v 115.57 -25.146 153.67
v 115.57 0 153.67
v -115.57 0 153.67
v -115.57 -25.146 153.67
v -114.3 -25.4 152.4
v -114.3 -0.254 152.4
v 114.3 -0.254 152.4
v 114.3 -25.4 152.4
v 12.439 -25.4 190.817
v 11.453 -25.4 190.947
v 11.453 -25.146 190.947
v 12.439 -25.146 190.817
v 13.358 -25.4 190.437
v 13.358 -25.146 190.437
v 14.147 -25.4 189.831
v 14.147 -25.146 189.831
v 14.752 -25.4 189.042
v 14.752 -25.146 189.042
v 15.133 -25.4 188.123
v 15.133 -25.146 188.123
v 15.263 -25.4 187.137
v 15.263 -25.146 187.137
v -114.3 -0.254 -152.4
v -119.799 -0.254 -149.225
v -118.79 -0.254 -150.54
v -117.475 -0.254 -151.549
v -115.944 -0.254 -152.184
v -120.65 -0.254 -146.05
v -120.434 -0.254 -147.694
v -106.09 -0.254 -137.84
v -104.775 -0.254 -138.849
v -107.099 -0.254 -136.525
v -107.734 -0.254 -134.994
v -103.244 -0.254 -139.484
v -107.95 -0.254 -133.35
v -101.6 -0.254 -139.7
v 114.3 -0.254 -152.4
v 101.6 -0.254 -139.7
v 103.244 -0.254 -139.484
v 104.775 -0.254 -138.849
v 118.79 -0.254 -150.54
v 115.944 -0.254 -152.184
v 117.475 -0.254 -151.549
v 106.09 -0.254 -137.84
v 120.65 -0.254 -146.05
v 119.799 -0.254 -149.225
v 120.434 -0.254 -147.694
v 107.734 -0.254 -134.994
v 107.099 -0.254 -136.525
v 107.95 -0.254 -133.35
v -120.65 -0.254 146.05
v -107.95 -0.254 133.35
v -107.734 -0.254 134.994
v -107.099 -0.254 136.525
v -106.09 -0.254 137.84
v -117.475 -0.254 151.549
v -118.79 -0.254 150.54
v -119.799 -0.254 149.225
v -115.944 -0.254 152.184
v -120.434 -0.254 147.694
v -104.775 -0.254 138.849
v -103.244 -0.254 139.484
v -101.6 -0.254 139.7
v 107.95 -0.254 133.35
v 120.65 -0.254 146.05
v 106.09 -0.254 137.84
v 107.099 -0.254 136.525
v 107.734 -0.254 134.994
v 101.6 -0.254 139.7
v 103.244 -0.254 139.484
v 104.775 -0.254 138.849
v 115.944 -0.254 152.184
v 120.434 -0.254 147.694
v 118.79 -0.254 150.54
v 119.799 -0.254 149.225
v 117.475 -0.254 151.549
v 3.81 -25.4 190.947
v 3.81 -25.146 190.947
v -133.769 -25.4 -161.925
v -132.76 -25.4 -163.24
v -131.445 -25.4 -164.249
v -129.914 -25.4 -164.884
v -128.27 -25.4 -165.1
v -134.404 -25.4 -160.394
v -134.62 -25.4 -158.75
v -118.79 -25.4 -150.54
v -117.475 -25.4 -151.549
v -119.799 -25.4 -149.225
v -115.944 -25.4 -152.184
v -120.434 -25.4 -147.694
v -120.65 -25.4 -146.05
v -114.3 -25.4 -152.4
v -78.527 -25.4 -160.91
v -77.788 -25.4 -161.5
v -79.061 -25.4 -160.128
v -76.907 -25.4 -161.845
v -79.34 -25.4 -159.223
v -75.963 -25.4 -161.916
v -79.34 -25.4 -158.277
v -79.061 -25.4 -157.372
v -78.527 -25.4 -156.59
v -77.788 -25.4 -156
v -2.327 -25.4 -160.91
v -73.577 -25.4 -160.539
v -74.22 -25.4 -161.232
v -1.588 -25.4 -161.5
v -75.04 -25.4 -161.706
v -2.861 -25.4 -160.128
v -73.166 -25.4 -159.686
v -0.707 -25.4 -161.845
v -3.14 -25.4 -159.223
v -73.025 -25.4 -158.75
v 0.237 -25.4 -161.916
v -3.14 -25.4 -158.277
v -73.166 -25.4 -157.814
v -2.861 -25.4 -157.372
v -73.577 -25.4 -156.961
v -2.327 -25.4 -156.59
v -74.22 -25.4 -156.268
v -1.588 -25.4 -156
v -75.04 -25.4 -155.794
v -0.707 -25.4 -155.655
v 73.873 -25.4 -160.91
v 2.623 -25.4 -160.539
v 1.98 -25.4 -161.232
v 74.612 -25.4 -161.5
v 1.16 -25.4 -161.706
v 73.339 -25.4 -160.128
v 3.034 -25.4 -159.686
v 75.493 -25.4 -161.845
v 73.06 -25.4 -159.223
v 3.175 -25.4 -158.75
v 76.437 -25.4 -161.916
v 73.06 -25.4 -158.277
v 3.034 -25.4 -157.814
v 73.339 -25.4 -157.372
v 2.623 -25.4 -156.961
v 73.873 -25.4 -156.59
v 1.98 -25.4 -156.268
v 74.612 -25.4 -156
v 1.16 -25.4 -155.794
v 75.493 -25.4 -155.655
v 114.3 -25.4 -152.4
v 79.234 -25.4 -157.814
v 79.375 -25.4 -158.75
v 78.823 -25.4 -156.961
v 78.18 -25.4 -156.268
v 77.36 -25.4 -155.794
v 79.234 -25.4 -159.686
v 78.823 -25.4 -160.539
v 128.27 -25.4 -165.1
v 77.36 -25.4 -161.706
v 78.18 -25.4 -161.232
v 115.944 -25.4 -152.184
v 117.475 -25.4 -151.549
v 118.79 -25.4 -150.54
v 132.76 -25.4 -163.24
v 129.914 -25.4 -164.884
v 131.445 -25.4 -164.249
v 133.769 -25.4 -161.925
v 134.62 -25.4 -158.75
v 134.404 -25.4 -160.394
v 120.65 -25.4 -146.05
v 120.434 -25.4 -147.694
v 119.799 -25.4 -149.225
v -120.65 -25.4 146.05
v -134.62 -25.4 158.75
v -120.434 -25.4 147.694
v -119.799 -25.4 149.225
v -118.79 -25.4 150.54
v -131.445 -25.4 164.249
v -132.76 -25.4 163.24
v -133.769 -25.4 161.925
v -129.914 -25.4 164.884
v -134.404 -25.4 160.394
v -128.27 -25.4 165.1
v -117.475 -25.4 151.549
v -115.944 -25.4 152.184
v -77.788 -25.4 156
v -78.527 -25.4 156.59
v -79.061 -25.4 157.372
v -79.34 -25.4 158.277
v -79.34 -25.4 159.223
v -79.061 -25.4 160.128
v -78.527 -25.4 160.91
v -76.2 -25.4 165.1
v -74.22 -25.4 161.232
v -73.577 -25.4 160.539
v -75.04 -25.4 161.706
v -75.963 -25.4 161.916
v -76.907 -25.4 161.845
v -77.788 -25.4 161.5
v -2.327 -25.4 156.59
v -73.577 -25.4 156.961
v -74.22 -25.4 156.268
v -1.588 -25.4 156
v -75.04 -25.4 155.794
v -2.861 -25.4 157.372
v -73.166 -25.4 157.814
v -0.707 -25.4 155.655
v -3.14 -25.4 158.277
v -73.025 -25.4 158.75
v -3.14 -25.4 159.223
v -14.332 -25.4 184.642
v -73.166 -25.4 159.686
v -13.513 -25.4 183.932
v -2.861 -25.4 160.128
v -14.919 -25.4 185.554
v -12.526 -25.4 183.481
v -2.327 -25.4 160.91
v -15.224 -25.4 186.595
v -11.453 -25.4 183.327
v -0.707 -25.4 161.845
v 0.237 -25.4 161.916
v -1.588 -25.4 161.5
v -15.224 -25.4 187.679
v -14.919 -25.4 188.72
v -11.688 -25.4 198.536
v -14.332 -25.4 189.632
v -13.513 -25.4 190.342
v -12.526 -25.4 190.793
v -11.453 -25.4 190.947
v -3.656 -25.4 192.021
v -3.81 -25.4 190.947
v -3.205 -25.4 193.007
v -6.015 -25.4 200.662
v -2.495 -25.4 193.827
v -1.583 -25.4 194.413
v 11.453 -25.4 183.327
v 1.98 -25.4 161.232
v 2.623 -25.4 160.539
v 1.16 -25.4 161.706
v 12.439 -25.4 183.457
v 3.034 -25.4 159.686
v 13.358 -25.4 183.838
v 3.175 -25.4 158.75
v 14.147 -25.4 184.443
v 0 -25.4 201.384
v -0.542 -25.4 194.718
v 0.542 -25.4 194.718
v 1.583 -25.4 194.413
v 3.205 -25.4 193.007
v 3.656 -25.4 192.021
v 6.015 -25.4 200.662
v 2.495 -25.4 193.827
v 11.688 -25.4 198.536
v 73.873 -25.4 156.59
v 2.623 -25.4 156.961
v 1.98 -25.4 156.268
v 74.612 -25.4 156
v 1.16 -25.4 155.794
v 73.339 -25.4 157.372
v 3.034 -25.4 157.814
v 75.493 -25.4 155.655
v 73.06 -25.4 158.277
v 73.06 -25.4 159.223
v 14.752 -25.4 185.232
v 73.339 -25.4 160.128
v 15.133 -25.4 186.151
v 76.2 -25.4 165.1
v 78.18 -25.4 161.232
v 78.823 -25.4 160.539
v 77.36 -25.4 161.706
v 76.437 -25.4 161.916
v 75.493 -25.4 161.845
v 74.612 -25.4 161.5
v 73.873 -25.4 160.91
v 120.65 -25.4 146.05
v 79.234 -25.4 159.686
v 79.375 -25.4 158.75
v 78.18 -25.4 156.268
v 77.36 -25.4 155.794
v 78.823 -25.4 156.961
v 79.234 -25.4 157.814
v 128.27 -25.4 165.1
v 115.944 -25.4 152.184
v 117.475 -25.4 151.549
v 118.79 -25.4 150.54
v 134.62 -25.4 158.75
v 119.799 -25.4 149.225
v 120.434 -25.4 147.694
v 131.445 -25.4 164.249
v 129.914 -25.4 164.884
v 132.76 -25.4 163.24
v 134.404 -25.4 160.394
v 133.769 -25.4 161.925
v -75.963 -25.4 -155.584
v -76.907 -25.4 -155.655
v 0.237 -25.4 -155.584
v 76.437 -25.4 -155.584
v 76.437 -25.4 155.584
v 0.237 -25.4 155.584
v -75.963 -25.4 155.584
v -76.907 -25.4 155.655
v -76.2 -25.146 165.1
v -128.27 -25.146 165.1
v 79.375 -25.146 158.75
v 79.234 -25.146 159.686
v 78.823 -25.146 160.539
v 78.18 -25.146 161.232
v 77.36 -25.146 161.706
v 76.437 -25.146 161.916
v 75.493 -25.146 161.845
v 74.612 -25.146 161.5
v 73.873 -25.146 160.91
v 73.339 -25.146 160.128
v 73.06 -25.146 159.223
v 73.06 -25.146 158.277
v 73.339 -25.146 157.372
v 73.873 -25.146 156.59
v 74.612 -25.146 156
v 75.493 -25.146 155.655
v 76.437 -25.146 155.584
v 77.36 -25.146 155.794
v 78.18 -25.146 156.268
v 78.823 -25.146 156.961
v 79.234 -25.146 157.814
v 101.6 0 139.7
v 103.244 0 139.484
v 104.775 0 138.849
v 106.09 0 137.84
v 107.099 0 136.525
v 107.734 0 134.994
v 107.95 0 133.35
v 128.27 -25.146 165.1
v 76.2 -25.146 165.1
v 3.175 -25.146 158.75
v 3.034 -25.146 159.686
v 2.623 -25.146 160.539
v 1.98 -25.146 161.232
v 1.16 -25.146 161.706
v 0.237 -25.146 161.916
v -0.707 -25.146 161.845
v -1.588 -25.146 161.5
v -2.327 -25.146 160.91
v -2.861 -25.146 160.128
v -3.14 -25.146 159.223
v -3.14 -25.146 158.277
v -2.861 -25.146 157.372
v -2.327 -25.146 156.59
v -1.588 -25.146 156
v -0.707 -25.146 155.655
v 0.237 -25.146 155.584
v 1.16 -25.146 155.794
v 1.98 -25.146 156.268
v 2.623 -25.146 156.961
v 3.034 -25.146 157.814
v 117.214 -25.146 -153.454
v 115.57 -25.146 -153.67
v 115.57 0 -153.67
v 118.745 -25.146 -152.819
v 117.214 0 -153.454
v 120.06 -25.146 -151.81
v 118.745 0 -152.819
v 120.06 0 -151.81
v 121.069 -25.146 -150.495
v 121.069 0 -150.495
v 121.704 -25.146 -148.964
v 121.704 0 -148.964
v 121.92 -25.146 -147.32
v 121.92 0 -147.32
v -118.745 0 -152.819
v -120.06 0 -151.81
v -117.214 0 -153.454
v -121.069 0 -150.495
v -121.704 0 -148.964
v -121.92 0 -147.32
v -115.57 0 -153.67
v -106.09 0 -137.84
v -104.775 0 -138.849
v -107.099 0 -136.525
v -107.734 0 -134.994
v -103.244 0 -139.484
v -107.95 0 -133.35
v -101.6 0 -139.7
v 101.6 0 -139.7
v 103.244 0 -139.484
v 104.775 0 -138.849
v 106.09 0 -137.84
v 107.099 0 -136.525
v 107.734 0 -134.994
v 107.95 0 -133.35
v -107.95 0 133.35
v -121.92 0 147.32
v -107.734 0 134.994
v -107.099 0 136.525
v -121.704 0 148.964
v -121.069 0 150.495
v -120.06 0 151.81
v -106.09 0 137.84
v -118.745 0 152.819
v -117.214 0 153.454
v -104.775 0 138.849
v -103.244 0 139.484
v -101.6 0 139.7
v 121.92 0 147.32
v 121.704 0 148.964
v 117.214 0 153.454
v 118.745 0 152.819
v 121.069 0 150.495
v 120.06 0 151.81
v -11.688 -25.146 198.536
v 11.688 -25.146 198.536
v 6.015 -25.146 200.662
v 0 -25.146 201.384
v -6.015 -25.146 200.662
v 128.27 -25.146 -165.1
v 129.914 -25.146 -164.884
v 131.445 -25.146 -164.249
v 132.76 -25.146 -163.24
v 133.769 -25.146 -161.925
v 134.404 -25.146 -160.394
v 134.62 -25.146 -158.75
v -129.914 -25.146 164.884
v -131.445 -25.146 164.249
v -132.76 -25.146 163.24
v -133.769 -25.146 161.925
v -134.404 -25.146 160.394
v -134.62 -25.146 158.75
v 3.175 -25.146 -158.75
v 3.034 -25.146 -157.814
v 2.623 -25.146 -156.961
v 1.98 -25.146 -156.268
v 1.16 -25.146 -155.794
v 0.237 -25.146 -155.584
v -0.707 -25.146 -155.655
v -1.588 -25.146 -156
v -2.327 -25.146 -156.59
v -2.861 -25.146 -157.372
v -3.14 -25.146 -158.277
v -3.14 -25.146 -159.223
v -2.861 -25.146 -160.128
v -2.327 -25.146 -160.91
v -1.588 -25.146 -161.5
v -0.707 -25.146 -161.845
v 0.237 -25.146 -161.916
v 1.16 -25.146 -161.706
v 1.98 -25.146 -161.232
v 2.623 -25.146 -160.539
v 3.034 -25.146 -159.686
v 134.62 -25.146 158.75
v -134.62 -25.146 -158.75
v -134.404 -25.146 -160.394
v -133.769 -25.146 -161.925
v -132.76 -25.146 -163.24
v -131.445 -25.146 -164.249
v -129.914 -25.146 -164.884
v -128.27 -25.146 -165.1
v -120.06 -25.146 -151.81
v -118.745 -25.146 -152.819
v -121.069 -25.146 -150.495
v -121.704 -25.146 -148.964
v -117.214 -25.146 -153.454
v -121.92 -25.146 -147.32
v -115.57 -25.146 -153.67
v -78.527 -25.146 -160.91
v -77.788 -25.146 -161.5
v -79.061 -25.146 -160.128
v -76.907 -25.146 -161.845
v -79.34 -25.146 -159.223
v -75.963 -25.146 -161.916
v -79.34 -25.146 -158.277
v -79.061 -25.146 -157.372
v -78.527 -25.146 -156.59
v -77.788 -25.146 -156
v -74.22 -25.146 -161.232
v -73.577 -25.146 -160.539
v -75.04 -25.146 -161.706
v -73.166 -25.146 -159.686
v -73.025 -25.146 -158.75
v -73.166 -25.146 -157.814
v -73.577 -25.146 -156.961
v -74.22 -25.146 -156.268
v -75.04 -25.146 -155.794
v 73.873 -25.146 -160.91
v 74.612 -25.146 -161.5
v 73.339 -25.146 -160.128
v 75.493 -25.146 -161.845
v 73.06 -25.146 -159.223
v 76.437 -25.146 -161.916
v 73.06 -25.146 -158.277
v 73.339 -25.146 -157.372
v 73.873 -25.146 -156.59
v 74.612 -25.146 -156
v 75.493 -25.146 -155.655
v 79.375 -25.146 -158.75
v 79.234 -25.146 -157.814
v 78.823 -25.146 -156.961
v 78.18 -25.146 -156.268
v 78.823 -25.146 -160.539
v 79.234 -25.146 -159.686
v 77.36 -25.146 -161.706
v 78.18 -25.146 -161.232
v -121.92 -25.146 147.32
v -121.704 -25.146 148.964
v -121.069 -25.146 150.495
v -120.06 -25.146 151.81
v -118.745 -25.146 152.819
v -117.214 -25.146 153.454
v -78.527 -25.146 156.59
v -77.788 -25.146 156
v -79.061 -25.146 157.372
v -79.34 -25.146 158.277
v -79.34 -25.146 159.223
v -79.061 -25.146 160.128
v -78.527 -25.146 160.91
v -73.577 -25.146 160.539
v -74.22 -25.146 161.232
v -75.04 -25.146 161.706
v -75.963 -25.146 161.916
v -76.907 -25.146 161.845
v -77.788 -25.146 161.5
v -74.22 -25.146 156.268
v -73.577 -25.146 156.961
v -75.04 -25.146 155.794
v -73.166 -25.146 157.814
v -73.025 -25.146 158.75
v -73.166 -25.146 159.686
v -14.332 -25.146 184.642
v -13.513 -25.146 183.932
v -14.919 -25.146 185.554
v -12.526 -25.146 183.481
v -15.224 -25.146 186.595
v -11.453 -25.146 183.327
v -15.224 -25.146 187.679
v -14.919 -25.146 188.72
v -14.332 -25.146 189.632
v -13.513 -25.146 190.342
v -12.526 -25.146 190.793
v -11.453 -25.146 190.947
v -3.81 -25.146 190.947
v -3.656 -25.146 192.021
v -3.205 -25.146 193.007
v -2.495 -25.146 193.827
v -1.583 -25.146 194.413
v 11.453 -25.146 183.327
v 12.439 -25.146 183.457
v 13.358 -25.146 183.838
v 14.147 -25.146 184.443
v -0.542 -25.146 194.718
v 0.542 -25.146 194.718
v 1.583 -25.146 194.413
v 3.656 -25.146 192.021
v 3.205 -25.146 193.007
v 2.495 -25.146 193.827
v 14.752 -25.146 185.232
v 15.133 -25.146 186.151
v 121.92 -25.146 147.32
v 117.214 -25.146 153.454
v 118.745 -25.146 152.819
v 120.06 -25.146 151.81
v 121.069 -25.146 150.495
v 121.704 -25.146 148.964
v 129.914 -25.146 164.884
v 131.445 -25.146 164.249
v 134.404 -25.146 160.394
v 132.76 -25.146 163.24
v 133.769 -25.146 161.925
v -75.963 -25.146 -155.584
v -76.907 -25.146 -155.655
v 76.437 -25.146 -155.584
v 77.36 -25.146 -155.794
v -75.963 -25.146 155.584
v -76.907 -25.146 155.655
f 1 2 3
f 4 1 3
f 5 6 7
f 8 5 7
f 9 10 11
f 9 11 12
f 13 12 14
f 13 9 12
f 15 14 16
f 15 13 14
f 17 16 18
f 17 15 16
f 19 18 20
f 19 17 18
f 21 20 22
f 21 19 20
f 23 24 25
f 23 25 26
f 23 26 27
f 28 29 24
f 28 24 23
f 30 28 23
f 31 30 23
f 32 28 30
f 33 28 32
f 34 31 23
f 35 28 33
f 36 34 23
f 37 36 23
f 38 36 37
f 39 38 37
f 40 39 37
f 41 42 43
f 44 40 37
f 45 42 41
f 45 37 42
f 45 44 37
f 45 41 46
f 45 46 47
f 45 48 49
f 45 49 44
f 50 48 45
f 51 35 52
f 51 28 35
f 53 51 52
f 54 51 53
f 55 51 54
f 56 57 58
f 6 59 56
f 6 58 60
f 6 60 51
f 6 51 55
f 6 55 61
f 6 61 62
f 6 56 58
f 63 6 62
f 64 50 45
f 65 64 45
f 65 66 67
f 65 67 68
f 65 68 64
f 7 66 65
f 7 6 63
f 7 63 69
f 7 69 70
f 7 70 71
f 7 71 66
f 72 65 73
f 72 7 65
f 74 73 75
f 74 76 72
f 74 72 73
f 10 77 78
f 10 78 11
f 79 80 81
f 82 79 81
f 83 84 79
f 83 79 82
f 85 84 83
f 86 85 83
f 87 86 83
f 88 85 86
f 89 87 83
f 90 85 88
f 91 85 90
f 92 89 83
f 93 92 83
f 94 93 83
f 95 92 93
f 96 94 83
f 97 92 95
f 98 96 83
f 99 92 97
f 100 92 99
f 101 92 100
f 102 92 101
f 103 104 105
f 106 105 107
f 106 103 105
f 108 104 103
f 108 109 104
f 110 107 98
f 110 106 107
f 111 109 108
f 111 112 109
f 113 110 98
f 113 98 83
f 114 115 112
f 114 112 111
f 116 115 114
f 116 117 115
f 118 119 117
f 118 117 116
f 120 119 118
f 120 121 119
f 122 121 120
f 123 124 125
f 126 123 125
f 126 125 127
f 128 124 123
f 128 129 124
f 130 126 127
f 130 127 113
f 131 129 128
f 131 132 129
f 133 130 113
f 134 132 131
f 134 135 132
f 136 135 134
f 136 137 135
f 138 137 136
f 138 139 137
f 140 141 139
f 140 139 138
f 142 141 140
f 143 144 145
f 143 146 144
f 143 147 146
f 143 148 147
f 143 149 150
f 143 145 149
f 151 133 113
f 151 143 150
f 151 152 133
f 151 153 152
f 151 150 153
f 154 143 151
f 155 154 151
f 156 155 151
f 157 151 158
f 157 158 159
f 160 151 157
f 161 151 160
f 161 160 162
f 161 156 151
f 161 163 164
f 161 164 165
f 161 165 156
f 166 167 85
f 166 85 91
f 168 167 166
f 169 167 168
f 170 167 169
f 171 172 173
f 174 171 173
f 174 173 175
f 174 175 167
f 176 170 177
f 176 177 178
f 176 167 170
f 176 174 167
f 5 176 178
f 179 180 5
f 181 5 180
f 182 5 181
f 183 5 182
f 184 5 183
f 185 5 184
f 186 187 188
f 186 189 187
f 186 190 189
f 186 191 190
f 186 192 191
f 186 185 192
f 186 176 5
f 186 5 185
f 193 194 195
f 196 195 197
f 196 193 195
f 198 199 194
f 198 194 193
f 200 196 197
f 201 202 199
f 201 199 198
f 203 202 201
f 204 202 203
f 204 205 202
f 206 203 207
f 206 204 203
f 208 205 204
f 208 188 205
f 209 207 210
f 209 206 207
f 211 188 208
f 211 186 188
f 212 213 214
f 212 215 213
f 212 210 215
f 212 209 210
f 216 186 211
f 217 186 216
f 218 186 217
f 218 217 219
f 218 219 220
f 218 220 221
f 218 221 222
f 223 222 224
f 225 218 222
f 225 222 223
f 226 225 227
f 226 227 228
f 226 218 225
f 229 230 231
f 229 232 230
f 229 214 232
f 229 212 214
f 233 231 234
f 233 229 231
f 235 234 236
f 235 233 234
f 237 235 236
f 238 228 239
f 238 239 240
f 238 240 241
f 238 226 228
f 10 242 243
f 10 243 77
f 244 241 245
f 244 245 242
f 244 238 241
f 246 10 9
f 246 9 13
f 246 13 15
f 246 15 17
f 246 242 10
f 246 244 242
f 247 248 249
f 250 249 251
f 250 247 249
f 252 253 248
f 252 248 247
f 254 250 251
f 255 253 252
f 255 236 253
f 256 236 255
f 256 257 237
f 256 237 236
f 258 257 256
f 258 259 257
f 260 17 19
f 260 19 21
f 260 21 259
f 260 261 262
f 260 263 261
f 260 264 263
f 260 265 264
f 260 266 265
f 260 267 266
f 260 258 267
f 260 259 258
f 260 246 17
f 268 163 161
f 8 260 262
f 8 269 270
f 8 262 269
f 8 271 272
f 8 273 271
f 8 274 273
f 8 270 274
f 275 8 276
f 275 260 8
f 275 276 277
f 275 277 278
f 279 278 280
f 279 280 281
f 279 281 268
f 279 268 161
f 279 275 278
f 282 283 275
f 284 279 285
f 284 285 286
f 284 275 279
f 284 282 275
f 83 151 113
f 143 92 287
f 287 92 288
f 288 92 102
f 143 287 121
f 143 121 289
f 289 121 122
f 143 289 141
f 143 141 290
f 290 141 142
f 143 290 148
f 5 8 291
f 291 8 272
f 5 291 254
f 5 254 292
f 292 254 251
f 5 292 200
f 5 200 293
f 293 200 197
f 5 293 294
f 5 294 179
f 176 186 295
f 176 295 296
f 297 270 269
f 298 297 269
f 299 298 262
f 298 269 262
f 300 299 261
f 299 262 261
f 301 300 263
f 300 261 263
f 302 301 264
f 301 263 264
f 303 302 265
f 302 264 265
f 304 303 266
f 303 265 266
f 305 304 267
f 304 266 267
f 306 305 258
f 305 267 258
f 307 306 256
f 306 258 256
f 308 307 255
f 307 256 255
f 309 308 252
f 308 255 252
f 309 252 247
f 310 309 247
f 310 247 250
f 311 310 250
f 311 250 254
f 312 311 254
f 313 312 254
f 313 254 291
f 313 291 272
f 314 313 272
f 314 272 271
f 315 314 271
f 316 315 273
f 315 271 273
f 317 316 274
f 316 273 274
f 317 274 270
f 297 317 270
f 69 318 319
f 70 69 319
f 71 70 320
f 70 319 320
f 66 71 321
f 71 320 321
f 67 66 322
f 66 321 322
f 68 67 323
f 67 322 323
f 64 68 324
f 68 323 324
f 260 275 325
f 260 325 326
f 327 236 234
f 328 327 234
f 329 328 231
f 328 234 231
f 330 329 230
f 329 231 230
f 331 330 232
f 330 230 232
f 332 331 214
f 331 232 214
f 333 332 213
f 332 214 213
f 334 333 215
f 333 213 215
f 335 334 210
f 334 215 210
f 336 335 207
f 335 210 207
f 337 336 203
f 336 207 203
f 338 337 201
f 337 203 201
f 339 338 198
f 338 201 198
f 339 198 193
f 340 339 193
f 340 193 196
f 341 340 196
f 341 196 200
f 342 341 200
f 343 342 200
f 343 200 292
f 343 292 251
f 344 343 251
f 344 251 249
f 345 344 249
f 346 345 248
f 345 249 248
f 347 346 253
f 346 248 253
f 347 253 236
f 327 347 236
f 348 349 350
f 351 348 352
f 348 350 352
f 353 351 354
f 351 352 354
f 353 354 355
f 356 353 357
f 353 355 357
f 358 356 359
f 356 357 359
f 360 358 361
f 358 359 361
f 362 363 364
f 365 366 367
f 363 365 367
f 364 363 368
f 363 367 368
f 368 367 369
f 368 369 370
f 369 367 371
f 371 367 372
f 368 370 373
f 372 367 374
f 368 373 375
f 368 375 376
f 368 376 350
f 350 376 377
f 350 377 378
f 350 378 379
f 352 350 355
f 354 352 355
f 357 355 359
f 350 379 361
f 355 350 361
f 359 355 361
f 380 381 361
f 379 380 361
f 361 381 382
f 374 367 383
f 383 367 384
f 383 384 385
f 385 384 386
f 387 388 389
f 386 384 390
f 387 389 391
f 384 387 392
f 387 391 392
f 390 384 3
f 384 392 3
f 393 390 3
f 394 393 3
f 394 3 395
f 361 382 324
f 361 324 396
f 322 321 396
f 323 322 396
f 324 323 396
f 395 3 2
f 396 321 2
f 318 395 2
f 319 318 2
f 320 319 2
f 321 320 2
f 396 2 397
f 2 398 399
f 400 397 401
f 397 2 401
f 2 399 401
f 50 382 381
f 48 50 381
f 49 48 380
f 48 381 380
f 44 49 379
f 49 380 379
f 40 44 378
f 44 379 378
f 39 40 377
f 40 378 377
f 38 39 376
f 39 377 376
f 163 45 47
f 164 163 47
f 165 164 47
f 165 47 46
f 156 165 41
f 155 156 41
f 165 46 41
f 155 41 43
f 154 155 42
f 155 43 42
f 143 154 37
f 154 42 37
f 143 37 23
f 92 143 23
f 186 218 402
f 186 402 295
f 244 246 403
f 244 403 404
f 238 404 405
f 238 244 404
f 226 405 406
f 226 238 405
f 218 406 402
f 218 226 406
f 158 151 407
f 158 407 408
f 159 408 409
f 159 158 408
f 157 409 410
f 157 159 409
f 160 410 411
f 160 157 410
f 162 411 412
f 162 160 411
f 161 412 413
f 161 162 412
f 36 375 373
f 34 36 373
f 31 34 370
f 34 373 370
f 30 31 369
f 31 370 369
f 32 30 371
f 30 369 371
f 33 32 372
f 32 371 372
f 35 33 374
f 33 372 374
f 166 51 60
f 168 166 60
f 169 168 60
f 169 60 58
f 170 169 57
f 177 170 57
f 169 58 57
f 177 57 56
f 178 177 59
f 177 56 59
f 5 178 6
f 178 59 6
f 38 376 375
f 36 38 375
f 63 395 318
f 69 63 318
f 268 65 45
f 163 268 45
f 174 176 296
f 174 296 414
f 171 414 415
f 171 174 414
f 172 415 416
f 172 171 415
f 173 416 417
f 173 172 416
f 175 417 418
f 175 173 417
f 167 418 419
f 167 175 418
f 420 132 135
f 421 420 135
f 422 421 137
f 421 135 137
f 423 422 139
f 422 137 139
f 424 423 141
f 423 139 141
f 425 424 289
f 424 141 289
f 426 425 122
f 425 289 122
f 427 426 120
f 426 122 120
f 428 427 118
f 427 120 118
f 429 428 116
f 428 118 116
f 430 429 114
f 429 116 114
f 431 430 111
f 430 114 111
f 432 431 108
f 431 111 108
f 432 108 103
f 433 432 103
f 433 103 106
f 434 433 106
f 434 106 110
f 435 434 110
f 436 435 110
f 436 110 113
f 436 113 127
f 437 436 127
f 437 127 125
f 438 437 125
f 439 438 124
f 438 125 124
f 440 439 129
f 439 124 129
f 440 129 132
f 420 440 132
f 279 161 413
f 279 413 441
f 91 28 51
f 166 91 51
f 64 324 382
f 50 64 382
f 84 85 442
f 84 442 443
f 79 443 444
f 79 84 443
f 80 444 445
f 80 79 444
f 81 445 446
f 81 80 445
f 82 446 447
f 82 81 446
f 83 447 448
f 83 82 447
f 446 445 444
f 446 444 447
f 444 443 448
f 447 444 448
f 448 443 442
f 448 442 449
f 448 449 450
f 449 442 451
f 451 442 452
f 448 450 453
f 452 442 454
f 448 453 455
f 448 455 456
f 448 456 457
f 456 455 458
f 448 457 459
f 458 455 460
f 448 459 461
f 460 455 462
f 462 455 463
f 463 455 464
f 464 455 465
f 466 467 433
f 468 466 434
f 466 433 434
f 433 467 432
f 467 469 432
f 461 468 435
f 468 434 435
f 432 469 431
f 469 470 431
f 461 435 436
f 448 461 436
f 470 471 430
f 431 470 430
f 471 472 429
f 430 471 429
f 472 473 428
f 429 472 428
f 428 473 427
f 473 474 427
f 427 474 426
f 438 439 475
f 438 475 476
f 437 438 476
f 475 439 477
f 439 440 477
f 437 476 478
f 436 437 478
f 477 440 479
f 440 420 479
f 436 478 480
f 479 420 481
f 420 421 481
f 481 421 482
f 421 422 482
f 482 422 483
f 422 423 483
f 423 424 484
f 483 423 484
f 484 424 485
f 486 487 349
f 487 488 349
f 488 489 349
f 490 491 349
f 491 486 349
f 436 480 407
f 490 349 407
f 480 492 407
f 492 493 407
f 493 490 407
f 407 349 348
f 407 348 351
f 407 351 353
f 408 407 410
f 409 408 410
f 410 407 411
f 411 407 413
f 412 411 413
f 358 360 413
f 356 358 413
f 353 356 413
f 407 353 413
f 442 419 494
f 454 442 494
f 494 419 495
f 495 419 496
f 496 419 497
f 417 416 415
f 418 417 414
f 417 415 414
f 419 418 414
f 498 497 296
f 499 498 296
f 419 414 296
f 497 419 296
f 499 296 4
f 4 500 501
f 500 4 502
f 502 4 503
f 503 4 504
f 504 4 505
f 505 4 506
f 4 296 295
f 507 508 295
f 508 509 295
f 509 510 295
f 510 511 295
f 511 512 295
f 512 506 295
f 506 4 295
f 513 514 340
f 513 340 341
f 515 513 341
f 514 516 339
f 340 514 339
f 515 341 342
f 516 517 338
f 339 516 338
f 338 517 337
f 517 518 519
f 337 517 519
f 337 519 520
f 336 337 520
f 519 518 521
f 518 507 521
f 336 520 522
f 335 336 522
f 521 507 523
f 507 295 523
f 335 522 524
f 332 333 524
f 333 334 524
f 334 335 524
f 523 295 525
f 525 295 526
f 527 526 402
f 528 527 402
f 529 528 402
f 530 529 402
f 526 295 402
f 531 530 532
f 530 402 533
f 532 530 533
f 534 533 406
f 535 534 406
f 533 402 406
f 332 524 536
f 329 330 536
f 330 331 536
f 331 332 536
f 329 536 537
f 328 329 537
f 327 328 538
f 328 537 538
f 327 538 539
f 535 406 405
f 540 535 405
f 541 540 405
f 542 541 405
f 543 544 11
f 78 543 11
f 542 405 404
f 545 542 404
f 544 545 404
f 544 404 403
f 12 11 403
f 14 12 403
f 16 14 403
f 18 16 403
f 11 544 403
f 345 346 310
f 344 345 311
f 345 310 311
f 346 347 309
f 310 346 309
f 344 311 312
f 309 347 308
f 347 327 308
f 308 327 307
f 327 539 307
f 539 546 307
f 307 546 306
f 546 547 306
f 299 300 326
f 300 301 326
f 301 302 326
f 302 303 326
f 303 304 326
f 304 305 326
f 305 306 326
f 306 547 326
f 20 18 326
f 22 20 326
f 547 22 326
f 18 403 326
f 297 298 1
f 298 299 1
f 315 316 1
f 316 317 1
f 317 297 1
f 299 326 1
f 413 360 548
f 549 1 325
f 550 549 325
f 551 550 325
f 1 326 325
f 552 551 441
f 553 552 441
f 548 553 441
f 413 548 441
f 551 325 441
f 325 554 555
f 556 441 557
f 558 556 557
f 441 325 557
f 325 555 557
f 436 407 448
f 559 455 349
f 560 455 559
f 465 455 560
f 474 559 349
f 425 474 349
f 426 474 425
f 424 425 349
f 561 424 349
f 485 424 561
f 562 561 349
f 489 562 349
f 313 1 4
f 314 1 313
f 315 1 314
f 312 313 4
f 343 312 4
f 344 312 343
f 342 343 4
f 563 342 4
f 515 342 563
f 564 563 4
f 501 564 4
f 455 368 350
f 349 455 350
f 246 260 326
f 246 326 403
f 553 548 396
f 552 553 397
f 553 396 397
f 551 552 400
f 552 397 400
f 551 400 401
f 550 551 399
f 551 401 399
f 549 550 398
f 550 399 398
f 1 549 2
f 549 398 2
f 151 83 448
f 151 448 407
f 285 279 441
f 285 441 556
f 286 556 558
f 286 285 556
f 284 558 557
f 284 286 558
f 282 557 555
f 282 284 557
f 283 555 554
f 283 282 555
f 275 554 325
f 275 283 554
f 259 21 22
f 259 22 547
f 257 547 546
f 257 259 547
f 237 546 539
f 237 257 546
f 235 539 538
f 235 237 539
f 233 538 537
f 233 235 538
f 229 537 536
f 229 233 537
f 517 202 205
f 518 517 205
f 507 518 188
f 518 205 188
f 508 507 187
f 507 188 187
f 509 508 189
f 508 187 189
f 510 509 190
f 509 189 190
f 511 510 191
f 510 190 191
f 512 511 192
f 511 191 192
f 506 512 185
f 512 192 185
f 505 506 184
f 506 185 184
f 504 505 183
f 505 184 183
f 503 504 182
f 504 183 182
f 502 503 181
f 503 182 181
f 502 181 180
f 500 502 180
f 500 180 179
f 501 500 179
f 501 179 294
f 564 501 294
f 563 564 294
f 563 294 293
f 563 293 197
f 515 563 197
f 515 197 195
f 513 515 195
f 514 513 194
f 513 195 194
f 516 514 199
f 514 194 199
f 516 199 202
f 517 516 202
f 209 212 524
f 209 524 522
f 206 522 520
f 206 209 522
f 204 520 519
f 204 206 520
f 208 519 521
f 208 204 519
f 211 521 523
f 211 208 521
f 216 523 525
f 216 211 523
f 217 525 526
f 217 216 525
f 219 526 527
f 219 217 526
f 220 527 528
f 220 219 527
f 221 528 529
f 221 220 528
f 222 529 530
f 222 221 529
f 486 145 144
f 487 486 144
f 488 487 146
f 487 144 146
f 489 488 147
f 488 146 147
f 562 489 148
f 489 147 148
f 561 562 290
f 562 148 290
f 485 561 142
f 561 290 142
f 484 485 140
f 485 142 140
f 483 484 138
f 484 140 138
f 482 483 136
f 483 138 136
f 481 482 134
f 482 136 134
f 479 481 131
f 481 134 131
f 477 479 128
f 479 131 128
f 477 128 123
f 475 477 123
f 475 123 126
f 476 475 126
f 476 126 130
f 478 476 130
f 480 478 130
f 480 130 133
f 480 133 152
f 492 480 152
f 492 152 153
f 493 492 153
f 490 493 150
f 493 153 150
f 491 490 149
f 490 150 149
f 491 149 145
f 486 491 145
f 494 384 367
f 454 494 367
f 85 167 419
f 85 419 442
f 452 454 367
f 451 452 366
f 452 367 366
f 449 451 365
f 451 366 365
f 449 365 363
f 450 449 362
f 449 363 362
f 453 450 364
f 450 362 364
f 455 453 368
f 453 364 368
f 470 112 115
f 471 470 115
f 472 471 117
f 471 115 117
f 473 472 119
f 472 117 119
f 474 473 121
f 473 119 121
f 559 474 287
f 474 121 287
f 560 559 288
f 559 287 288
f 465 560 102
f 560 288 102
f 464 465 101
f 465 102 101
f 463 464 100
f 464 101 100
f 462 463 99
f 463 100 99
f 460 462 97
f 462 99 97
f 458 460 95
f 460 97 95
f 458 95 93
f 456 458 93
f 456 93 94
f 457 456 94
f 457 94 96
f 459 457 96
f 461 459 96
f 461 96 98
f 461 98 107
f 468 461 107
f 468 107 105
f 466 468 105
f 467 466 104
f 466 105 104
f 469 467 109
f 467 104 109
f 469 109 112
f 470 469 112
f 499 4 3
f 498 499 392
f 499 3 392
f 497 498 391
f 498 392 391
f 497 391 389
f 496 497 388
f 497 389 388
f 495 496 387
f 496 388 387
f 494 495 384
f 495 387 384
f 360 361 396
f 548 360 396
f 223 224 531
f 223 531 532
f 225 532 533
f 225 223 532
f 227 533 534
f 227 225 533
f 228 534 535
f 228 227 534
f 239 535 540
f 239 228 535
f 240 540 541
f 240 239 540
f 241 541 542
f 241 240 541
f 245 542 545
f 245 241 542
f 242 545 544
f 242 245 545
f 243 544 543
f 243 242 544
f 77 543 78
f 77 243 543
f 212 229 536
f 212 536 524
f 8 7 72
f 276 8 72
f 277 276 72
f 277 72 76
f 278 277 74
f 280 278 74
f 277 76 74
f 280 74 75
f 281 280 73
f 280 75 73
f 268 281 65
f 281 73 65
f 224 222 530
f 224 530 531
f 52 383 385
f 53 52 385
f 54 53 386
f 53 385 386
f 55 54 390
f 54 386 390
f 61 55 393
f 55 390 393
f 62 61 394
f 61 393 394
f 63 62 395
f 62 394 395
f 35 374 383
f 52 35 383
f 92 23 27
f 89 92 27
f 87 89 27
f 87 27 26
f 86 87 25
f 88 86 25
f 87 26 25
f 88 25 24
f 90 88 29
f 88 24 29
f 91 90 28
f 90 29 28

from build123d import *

# Parameters (mm, degrees)
F1_DEPTH = 25.4
F2_DEPTH = 0.254
F3_R     = 3.175
F4_DEPTH = 0.254


with BuildPart() as f1:
    # F0 (on Front) → F1 (new body)
    with BuildSketch(Plane.XZ):
        with BuildLine():
            Line((-115.57, -153.67), (115.57, -153.67))
            ThreePointArc((115.57, -153.67), (120.060128, -151.810128), (121.92, -147.32))
            Line((121.92, -147.32), (121.92, 147.32))
            ThreePointArc((121.92, 147.32), (120.060128, 151.810128), (115.57, 153.67))
            Line((115.57, 153.67), (-115.57, 153.67))
            ThreePointArc((-115.57, 153.67), (-120.060128, 151.810128), (-121.92, 147.32))
            Line((-121.92, 147.32), (-121.92, -147.32))
            ThreePointArc((-121.92, -147.32), (-120.060128, -151.810128), (-115.57, -153.67))
        make_face()
        with BuildLine():
            ThreePointArc((120.65, -146.05), (118.790128, -150.540128), (114.3, -152.4))
            Line((114.3, -152.4), (-114.3, -152.4))
            ThreePointArc((-114.3, -152.4), (-118.790128, -150.540128), (-120.65, -146.05))
            Line((-120.65, -146.05), (-120.65, 146.05))
            ThreePointArc((-120.65, 146.05), (-118.790128, 150.540128), (-114.3, 152.4))
            Line((-114.3, 152.4), (114.3, 152.4))
            ThreePointArc((114.3, 152.4), (118.790128, 150.540128), (120.65, 146.05))
            Line((120.65, 146.05), (120.65, -146.05))
        make_face(mode=Mode.SUBTRACT)
    extrude(amount=F1_DEPTH)

    # F0 (on Front) → F2 (join)
    with BuildSketch(Plane.XZ):
        with BuildLine():
            Line((-114.3, -152.4), (114.3, -152.4))
            ThreePointArc((114.3, -152.4), (118.790128, -150.540128), (120.65, -146.05))
            Line((120.65, -146.05), (120.65, 146.05))
            ThreePointArc((120.65, 146.05), (118.790128, 150.540128), (114.3, 152.4))
            Line((114.3, 152.4), (-114.3, 152.4))
            ThreePointArc((-114.3, 152.4), (-118.790128, 150.540128), (-120.65, 146.05))
            Line((-120.65, 146.05), (-120.65, -146.05))
            ThreePointArc((-120.65, -146.05), (-118.790128, -150.540128), (-114.3, -152.4))
        make_face()
        with BuildLine():
            ThreePointArc((107.95, -133.35), (106.090128, -137.840128), (101.6, -139.7))
            Line((101.6, -139.7), (-101.6, -139.7))
            ThreePointArc((-101.6, -139.7), (-106.090128, -137.840128), (-107.95, -133.35))
            Line((-107.95, -133.35), (-107.95, 133.35))
            ThreePointArc((-107.95, 133.35), (-106.090128, 137.840128), (-101.6, 139.7))
            Line((-101.6, 139.7), (101.6, 139.7))
            ThreePointArc((101.6, 139.7), (106.090128, 137.840128), (107.95, 133.35))
            Line((107.95, 133.35), (107.95, -133.35))
        make_face(mode=Mode.SUBTRACT)
    extrude(amount=F2_DEPTH)

    # F3 (on face) → F4 (join)
    with BuildSketch(Plane.XZ.offset(25.4)):
        with BuildLine():
            Line((-121.92, 147.32), (-121.92, -147.32))
            ThreePointArc((-121.92, -147.32), (-120.060128, -151.810128), (-115.57, -153.67))
            Line((-115.57, -153.67), (115.57, -153.67))
            ThreePointArc((115.57, -153.67), (120.060128, -151.810128), (121.92, -147.32))
            Line((121.92, -147.32), (121.92, 147.32))
            ThreePointArc((121.92, 147.32), (120.060128, 151.810128), (115.57, 153.67))
            Line((115.57, 153.67), (-115.57, 153.67))
            ThreePointArc((-115.57, 153.67), (-120.060128, 151.810128), (-121.92, 147.32))
        make_face()
        with BuildLine():
            Line((120.65, 146.05), (120.65, -146.05))
            ThreePointArc((120.65, -146.05), (118.790128, -150.540128), (114.3, -152.4))
            Line((114.3, -152.4), (-114.3, -152.4))
            ThreePointArc((-114.3, -152.4), (-118.790128, -150.540128), (-120.65, -146.05))
            Line((-120.65, -146.05), (-120.65, 146.05))
            ThreePointArc((-120.65, 146.05), (-118.790128, 150.540128), (-114.3, 152.4))
            Line((-114.3, 152.4), (114.3, 152.4))
            ThreePointArc((114.3, 152.4), (118.790128, 150.540128), (120.65, 146.05))
        make_face(mode=Mode.SUBTRACT)
        with BuildLine():
            Line((-128.27, -165.1), (128.27, -165.1))
            ThreePointArc((128.27, -165.1), (132.760128, -163.240128), (134.62, -158.75))
            Line((134.62, -158.75), (134.62, 158.75))
            ThreePointArc((134.62, 158.75), (132.760128, 163.240128), (128.27, 165.1))
            Line((128.27, 165.1), (76.2, 165.1))
            Line((76.2, 165.1), (11.687881, 198.535574))
            ThreePointArc((11.687881, 198.535574), (0, 201.384445), (-11.687881, 198.535574))
            Line((-11.687881, 198.535574), (-76.2, 165.1))
            Line((-76.2, 165.1), (-128.27, 165.1))
            ThreePointArc((-128.27, 165.1), (-132.760128, 163.240128), (-134.62, 158.75))
            Line((-134.62, 158.75), (-134.62, -158.75))
            ThreePointArc((-134.62, -158.75), (-132.760128, -163.240128), (-128.27, -165.1))
        make_face()
        with Locations((-76.2, -158.75)):
            Circle(F3_R, mode=Mode.SUBTRACT)
        with Locations((0, -158.75)):
            Circle(F3_R, mode=Mode.SUBTRACT)
        with Locations((76.2, -158.75)):
            Circle(F3_R, mode=Mode.SUBTRACT)
        with BuildLine():
            ThreePointArc((-115.57, -153.67), (-120.060128, -151.810128), (-121.92, -147.32))
            Line((-121.92, -147.32), (-121.92, 147.32))
            ThreePointArc((-121.92, 147.32), (-120.060128, 151.810128), (-115.57, 153.67))
            Line((-115.57, 153.67), (115.57, 153.67))
            ThreePointArc((115.57, 153.67), (120.060128, 151.810128), (121.92, 147.32))
            Line((121.92, 147.32), (121.92, -147.32))
            ThreePointArc((121.92, -147.32), (120.060128, -151.810128), (115.57, -153.67))
            Line((115.57, -153.67), (-115.57, -153.67))
        make_face(mode=Mode.SUBTRACT)
        with Locations((-76.2, 158.75)):
            Circle(F3_R, mode=Mode.SUBTRACT)
        with Locations((0, 158.75)):
            Circle(F3_R, mode=Mode.SUBTRACT)
        with BuildLine():
            ThreePointArc((-3.81, 190.947112), (0, 194.757112), (3.81, 190.947112))
            Line((3.81, 190.947112), (11.45294, 190.947112))
            ThreePointArc((11.45294, 190.947112), (14.147017, 189.831189), (15.26294, 187.137112))
            ThreePointArc((15.26294, 187.137112), (14.147017, 184.443035), (11.45294, 183.327112))
            Line((11.45294, 183.327112), (-11.45294, 183.327112))
            ThreePointArc((-11.45294, 183.327112), (-15.26294, 187.137112), (-11.45294, 190.947112))
            Line((-11.45294, 190.947112), (-3.81, 190.947112))
        make_face(mode=Mode.SUBTRACT)
        with Locations((76.2, 158.75)):
            Circle(F3_R, mode=Mode.SUBTRACT)
    extrude(amount=-F4_DEPTH)


solid = f1.part
